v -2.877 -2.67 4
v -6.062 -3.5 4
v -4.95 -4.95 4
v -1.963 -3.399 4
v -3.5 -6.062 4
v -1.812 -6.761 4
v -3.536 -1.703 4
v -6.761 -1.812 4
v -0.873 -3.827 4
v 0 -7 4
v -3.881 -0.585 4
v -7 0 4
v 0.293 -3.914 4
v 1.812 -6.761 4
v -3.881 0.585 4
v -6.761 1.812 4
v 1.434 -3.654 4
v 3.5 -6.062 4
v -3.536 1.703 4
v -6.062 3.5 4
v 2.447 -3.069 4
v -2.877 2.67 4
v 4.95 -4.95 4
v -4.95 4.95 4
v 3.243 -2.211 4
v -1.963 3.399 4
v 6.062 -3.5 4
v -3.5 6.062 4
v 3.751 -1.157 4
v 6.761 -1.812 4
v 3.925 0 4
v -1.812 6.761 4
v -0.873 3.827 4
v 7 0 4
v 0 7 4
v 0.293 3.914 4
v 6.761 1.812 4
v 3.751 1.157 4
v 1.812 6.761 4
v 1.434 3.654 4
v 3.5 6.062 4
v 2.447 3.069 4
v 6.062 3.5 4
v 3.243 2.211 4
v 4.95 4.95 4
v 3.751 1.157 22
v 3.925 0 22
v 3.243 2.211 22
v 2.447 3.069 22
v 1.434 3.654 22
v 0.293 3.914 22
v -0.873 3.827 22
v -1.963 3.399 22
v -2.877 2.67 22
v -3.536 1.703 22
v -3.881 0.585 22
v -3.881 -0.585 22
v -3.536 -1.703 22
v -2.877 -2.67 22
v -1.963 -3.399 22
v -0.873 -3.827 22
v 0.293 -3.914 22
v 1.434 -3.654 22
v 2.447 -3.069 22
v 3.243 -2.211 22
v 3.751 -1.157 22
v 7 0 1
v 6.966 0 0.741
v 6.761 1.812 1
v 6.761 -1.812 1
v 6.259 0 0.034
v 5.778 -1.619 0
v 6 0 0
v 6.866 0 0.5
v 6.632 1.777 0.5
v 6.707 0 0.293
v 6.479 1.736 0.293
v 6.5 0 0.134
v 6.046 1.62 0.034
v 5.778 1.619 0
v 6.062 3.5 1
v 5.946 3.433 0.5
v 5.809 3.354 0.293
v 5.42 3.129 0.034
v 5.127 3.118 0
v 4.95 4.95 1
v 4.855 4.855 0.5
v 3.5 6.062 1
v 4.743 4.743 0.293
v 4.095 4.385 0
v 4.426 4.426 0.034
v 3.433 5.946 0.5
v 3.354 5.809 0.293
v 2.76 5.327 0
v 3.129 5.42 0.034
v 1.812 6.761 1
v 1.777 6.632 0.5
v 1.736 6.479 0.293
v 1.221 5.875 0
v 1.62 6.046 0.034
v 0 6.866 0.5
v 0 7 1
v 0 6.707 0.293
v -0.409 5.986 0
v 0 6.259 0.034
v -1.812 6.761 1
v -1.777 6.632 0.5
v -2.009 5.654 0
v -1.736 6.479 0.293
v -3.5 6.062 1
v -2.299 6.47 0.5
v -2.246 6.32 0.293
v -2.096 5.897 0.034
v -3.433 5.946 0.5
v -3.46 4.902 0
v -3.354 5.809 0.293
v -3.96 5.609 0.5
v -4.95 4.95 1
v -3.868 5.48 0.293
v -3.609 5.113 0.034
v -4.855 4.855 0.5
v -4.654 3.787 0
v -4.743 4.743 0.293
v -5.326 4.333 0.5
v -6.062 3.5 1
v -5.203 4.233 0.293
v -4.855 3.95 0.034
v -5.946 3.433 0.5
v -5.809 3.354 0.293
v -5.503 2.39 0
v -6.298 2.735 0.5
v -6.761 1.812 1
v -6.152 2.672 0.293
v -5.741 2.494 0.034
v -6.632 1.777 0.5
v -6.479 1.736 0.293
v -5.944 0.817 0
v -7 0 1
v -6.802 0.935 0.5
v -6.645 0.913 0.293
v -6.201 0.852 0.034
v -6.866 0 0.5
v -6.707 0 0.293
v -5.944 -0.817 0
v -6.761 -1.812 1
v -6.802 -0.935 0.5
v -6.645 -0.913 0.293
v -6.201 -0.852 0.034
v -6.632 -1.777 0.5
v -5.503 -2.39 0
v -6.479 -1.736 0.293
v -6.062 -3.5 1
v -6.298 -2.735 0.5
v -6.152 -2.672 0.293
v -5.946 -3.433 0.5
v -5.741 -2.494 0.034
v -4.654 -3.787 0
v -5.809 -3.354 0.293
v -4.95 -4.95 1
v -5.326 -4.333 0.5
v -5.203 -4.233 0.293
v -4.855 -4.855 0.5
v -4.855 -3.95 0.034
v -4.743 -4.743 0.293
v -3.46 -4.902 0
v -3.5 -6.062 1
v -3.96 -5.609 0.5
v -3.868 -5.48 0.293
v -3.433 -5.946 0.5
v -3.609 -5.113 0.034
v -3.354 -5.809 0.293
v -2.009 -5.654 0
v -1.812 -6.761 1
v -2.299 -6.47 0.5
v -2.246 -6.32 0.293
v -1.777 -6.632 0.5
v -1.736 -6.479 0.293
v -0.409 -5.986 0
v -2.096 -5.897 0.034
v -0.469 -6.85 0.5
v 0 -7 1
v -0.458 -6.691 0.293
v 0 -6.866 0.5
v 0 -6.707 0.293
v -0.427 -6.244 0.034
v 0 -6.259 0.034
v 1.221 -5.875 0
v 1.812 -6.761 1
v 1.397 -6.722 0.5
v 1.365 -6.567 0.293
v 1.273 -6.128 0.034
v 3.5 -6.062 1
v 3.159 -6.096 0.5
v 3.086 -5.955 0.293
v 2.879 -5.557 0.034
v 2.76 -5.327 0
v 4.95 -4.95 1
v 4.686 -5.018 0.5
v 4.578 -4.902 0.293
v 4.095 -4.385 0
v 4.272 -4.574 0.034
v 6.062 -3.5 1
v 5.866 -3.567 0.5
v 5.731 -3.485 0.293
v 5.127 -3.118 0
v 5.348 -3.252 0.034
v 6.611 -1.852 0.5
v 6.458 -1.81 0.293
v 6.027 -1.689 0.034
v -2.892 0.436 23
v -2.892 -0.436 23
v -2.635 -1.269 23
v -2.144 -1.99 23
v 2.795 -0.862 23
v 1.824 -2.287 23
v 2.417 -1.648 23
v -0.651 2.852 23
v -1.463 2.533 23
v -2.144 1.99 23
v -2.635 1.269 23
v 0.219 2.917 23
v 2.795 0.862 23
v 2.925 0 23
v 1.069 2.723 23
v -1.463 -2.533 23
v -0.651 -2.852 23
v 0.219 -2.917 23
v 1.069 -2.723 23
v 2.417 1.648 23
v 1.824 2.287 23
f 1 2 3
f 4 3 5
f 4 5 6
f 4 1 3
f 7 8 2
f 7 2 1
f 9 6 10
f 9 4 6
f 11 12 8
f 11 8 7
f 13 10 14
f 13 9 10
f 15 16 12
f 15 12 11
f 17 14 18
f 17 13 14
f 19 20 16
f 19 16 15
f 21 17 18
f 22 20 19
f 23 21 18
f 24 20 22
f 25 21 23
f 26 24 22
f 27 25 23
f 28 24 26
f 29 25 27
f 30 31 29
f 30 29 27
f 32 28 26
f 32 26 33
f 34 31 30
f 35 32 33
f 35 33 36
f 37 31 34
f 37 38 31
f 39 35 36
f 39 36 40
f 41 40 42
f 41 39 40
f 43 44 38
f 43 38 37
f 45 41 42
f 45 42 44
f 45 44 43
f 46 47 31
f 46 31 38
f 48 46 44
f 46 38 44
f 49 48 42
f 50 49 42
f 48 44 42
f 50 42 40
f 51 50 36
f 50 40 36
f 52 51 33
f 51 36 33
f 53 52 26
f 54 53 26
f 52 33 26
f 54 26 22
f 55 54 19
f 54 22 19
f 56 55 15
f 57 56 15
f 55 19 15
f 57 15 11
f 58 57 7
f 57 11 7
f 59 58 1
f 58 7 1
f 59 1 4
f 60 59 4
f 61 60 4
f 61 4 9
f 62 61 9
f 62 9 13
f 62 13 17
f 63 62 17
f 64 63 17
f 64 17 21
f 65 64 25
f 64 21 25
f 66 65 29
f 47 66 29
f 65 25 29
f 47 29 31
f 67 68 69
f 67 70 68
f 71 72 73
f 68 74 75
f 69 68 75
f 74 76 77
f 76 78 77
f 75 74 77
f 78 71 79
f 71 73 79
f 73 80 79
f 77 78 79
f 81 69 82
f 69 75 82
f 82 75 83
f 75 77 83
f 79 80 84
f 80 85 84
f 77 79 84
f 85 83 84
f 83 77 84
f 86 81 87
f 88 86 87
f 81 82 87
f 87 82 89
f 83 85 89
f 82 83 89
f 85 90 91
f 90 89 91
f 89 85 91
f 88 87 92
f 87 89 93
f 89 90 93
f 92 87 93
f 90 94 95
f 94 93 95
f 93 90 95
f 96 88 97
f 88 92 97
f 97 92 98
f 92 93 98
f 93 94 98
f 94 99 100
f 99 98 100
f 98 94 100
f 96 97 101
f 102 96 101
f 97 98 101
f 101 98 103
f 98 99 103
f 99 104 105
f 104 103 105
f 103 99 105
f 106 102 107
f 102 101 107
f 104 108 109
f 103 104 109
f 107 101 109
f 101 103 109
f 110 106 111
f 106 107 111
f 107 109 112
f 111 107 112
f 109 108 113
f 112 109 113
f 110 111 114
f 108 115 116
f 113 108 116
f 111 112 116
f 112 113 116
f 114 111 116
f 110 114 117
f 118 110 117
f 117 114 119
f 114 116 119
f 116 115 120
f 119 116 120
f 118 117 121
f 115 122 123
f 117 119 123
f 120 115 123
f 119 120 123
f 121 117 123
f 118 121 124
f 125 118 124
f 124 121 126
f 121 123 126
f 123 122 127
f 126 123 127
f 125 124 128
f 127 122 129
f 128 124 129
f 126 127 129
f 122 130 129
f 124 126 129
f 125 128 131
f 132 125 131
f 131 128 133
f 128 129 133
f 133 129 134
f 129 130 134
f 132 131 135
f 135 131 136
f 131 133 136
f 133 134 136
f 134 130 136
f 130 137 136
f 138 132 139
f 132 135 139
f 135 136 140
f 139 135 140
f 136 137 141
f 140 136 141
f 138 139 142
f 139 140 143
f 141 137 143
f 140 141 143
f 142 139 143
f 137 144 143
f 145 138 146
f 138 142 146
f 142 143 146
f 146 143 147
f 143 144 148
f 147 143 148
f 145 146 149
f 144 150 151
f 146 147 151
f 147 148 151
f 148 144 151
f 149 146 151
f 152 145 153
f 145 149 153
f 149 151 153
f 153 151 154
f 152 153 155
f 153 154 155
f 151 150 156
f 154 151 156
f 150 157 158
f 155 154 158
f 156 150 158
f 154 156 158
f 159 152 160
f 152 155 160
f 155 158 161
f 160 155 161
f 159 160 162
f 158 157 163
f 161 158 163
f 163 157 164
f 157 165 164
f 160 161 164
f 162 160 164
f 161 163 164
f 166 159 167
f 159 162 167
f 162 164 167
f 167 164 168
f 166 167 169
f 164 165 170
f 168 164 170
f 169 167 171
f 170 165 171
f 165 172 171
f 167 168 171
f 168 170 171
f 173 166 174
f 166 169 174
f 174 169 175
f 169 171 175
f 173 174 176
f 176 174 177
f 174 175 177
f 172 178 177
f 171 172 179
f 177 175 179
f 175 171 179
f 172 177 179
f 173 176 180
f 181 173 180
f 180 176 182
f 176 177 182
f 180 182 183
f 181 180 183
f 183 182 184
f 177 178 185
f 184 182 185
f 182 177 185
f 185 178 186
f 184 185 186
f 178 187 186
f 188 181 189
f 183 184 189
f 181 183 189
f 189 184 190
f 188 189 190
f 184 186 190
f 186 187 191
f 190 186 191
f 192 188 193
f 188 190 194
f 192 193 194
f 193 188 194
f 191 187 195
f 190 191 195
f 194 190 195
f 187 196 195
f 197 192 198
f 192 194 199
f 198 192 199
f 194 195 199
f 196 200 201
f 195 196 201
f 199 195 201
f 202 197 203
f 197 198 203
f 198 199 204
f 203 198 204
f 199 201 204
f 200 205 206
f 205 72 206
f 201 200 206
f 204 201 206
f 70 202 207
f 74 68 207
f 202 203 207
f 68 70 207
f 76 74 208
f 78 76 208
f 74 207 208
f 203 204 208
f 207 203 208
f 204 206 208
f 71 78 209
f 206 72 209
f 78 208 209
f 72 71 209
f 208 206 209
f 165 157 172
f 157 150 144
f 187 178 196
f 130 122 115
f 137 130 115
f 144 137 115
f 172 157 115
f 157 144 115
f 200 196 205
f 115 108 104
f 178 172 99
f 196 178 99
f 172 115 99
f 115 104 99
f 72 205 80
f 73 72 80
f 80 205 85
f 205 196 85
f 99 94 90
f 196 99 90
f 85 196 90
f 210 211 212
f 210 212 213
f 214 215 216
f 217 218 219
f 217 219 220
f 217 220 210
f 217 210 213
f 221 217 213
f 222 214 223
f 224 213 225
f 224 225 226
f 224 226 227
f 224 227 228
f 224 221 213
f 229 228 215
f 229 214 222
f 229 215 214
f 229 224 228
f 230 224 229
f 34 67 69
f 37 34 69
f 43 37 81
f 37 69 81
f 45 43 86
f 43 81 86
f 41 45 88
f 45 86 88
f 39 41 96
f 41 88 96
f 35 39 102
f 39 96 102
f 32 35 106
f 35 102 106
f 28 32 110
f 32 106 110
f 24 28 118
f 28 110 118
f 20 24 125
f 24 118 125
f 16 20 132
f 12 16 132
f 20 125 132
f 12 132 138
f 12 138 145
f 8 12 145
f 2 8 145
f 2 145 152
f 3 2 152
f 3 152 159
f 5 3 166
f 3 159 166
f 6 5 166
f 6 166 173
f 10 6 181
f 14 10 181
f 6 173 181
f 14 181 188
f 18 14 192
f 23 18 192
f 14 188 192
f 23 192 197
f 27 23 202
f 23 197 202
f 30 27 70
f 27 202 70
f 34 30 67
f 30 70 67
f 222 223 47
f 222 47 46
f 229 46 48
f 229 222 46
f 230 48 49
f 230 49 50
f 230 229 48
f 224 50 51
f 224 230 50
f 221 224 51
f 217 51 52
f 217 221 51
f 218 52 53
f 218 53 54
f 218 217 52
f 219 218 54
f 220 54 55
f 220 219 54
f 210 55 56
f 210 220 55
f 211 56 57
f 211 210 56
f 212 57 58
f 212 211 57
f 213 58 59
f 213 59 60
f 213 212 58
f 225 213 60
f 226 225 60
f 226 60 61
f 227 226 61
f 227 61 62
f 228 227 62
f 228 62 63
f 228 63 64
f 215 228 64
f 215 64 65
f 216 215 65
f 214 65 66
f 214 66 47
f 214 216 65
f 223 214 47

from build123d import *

# Parameters (mm, degrees)
SKETCH_R     = 7
PAD_DEPTH    = 4
SKETCH001_R  = 3.925
PAD001_DEPTH = 19
CHAMFER_SIZE = 1
FILLET_R     = 1


with BuildPart() as part:
    # Sketch → Pad (new body)
    with BuildSketch(Plane.XY):
        Circle(SKETCH_R)
    extrude(amount=PAD_DEPTH)

    # Sketch001 (on Face3 of Pad) → Pad001 (join)
    with BuildSketch(Plane.XY.offset(4)):
        Circle(SKETCH001_R)
    extrude(amount=PAD001_DEPTH)

    # Chamfer
    chamfer_edges = [part.edges().sort_by_distance(p)[0] for p in [
        (-3.925, 0, 23),
    ]]
    chamfer(chamfer_edges, length=CHAMFER_SIZE)

    # Fillet
    fillet_edges = [part.edges().sort_by_distance(p)[0] for p in [
        (-7, 0, 0),
    ]]
    fillet(fillet_edges, radius=FILLET_R)


solid = part.part
